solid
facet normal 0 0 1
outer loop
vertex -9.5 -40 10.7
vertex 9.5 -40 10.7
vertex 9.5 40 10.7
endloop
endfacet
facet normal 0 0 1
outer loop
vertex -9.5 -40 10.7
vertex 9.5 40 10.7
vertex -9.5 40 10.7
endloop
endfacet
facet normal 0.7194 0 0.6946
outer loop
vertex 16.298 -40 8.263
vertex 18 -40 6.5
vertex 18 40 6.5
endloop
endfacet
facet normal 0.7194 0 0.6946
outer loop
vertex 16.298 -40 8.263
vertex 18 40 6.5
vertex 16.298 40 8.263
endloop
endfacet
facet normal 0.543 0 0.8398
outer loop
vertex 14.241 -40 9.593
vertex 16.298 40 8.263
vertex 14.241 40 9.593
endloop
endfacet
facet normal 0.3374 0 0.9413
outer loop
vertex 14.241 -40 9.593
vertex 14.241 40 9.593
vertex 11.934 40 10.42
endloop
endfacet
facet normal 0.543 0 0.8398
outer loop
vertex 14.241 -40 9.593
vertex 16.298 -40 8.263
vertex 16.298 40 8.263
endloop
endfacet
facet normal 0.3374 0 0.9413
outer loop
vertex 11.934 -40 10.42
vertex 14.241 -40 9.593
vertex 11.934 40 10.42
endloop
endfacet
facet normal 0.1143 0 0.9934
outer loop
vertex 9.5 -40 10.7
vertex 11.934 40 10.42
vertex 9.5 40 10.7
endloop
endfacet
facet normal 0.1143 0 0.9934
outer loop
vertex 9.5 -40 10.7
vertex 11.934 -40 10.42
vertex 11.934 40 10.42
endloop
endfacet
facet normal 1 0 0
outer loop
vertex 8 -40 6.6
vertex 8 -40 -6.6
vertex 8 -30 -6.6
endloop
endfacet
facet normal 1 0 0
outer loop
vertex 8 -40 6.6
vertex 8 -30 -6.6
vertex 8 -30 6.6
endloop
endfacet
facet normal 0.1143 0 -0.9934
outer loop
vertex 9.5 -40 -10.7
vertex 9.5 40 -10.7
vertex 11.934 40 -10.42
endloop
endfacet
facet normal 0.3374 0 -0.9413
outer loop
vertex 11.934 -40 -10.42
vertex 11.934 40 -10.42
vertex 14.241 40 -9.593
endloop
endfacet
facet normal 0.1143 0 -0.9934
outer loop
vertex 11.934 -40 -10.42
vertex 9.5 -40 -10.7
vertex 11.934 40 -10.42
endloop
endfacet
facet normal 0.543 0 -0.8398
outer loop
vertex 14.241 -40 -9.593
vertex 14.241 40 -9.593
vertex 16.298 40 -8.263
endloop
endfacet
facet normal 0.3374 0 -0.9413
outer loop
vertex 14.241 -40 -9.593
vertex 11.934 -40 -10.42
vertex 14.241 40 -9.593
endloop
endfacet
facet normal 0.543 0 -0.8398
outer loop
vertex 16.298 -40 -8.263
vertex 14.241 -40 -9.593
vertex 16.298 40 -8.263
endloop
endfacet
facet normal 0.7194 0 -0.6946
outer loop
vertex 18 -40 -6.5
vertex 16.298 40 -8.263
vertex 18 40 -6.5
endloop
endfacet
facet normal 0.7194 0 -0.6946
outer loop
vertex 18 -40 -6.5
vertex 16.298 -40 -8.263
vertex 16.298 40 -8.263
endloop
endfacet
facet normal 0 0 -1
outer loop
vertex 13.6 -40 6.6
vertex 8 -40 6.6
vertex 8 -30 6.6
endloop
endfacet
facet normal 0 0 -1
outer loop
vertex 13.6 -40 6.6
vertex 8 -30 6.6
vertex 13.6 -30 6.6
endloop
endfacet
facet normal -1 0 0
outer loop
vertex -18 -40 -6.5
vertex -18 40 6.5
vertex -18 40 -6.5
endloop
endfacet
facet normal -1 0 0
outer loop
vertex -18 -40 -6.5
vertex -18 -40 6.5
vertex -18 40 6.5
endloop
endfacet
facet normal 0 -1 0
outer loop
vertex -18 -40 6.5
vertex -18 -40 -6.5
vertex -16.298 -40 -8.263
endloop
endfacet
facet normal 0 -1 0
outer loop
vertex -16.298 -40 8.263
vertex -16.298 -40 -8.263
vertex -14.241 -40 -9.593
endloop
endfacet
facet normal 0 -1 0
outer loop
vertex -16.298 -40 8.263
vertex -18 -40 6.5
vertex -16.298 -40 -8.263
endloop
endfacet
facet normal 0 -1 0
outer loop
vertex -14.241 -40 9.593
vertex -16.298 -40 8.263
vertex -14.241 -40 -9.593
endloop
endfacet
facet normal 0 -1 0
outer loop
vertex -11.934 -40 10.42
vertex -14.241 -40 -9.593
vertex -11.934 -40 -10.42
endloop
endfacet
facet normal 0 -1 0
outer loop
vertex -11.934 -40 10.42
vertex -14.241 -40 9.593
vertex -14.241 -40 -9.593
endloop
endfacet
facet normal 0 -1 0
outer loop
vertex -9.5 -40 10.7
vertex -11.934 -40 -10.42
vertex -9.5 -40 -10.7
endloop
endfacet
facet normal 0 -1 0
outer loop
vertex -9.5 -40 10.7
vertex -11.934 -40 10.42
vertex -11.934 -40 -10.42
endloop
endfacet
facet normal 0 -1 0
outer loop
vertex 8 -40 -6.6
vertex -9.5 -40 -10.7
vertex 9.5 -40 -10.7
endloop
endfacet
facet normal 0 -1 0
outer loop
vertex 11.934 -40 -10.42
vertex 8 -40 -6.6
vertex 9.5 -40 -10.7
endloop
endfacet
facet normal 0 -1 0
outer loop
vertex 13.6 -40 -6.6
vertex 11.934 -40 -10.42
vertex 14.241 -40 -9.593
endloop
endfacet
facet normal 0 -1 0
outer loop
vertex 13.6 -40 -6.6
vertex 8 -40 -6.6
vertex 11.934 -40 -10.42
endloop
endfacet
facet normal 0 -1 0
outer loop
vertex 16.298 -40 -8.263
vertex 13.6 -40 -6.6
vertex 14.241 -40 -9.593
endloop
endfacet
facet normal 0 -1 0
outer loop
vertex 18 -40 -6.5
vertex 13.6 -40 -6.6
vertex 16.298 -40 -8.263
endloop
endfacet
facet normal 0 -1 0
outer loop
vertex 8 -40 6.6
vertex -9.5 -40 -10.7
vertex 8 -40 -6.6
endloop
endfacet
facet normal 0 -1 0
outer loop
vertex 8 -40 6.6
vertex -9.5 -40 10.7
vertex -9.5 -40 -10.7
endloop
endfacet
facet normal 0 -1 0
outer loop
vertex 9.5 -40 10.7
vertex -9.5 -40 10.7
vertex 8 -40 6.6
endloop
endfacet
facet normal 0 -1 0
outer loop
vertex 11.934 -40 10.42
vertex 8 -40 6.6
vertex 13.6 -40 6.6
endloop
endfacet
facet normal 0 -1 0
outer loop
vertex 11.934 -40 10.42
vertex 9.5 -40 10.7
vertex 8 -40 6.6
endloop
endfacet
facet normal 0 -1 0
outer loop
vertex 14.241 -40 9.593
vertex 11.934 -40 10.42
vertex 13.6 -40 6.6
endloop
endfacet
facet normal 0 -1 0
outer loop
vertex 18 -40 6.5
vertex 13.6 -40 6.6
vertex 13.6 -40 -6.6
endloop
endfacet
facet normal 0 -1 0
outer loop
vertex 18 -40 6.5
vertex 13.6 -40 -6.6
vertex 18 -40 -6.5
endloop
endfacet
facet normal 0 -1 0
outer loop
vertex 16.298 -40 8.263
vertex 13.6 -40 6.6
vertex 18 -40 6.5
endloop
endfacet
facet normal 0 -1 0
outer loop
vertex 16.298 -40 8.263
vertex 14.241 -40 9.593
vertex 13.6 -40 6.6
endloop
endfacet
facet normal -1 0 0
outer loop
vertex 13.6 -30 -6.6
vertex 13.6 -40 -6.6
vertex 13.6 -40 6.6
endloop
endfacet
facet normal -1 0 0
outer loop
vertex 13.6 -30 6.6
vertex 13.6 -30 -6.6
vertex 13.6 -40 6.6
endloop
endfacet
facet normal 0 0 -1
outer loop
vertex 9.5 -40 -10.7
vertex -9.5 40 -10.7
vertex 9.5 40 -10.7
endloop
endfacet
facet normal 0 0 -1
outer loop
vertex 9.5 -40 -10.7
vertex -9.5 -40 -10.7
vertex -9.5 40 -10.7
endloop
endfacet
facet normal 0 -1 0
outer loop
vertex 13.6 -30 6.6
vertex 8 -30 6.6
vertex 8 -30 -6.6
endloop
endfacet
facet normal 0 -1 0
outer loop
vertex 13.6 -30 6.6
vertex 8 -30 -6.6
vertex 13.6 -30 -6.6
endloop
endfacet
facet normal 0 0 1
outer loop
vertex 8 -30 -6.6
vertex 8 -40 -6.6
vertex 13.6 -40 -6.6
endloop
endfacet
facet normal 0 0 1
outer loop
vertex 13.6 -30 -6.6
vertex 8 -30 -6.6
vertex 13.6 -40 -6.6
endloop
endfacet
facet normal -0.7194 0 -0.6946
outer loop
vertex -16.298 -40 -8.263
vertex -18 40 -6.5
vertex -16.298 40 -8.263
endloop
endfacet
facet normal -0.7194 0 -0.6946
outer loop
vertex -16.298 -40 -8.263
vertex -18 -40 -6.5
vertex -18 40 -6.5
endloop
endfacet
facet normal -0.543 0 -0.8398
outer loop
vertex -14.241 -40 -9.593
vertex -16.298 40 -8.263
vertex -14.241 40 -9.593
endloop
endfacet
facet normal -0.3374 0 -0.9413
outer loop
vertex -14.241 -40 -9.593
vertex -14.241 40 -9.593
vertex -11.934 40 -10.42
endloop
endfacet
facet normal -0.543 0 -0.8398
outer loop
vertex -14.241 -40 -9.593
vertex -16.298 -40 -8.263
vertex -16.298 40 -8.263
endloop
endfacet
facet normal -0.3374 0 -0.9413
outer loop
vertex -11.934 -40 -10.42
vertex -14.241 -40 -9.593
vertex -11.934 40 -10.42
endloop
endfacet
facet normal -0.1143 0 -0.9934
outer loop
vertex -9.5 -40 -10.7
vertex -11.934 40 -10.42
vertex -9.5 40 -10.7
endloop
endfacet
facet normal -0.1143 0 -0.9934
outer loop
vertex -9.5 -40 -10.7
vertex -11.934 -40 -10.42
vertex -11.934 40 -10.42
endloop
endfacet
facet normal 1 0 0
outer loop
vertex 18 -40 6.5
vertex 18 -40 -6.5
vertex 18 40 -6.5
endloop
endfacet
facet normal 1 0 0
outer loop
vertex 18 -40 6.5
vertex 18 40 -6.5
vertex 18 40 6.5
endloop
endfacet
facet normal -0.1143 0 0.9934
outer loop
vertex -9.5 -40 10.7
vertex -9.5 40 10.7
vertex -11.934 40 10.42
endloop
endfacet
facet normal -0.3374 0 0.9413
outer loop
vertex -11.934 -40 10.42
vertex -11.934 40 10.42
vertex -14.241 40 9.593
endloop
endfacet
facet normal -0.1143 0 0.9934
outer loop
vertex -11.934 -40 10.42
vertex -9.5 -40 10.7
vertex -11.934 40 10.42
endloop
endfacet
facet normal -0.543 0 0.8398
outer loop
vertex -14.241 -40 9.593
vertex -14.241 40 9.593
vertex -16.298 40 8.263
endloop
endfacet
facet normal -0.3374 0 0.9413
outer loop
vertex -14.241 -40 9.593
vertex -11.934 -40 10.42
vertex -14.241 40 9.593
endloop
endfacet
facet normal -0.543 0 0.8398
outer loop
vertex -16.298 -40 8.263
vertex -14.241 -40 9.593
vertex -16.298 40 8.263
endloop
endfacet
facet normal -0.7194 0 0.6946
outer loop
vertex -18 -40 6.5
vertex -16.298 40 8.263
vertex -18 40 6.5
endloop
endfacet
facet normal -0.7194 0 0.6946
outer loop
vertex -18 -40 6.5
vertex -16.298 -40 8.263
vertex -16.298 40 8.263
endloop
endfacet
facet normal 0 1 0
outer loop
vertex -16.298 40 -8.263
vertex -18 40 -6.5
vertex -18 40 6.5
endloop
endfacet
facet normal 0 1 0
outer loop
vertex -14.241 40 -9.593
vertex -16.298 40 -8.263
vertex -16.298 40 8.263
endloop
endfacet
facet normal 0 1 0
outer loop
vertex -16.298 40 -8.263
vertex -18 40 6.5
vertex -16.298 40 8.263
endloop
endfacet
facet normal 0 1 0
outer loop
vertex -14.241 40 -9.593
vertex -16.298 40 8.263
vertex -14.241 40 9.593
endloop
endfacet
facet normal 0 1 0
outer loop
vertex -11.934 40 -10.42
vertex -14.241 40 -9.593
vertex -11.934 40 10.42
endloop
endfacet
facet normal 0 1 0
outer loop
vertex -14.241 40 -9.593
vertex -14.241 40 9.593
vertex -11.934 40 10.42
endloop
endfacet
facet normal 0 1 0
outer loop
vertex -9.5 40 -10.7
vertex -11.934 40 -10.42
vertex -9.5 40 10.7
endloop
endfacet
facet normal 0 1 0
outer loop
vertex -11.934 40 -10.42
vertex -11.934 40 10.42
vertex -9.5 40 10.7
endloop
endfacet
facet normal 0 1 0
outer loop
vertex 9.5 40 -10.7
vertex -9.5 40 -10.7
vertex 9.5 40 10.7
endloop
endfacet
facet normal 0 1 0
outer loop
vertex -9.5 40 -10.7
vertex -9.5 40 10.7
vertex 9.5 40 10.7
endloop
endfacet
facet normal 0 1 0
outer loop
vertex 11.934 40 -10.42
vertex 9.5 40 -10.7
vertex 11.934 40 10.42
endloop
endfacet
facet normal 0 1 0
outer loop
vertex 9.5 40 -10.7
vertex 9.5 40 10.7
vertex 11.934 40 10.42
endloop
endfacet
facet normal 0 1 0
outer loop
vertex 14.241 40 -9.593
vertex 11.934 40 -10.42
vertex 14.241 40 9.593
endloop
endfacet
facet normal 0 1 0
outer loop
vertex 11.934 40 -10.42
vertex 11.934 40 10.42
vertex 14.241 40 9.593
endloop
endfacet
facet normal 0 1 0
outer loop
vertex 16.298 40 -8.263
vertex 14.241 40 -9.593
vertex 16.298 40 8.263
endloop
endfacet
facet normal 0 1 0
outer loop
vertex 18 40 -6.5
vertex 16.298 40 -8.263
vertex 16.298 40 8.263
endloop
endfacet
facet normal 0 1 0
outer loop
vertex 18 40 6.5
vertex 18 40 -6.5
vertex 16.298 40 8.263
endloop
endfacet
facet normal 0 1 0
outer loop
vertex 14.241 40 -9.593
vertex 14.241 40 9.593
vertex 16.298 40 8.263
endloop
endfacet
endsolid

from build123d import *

# Parameters (mm, degrees)
F1_DEPTH = 40
F2_W     = 5.6
F2_H     = 13.2
F3_DEPTH = 10


with BuildPart() as f1:
    # F0 (on Front) → F1 (new body, symmetric)
    with BuildSketch(Plane.XZ):
        with BuildLine():
            Line((-9.5, -10.7), (9.5, -10.7))
            ThreePointArc((9.5, -10.7), (14.240517, -9.592713), (18, -6.5))
            Line((18, -6.5), (18, 6.5))
            ThreePointArc((18, 6.5), (14.240517, 9.592713), (9.5, 10.7))
            Line((9.5, 10.7), (-9.5, 10.7))
            ThreePointArc((-9.5, 10.7), (-14.240517, 9.592713), (-18, 6.5))
            Line((-18, 6.5), (-18, -6.5))
            ThreePointArc((-18, -6.5), (-14.240517, -9.592713), (-9.5, -10.7))
        make_face()
    extrude(amount=F1_DEPTH, both=True)

    # F2 (on face) → F3 (cut)
    with BuildSketch(Plane.XZ.offset(40)):
        with Locations((10.8, 0)):
            Rectangle(F2_W, F2_H)
    extrude(amount=-F3_DEPTH, mode=Mode.SUBTRACT)


solid = f1.part
